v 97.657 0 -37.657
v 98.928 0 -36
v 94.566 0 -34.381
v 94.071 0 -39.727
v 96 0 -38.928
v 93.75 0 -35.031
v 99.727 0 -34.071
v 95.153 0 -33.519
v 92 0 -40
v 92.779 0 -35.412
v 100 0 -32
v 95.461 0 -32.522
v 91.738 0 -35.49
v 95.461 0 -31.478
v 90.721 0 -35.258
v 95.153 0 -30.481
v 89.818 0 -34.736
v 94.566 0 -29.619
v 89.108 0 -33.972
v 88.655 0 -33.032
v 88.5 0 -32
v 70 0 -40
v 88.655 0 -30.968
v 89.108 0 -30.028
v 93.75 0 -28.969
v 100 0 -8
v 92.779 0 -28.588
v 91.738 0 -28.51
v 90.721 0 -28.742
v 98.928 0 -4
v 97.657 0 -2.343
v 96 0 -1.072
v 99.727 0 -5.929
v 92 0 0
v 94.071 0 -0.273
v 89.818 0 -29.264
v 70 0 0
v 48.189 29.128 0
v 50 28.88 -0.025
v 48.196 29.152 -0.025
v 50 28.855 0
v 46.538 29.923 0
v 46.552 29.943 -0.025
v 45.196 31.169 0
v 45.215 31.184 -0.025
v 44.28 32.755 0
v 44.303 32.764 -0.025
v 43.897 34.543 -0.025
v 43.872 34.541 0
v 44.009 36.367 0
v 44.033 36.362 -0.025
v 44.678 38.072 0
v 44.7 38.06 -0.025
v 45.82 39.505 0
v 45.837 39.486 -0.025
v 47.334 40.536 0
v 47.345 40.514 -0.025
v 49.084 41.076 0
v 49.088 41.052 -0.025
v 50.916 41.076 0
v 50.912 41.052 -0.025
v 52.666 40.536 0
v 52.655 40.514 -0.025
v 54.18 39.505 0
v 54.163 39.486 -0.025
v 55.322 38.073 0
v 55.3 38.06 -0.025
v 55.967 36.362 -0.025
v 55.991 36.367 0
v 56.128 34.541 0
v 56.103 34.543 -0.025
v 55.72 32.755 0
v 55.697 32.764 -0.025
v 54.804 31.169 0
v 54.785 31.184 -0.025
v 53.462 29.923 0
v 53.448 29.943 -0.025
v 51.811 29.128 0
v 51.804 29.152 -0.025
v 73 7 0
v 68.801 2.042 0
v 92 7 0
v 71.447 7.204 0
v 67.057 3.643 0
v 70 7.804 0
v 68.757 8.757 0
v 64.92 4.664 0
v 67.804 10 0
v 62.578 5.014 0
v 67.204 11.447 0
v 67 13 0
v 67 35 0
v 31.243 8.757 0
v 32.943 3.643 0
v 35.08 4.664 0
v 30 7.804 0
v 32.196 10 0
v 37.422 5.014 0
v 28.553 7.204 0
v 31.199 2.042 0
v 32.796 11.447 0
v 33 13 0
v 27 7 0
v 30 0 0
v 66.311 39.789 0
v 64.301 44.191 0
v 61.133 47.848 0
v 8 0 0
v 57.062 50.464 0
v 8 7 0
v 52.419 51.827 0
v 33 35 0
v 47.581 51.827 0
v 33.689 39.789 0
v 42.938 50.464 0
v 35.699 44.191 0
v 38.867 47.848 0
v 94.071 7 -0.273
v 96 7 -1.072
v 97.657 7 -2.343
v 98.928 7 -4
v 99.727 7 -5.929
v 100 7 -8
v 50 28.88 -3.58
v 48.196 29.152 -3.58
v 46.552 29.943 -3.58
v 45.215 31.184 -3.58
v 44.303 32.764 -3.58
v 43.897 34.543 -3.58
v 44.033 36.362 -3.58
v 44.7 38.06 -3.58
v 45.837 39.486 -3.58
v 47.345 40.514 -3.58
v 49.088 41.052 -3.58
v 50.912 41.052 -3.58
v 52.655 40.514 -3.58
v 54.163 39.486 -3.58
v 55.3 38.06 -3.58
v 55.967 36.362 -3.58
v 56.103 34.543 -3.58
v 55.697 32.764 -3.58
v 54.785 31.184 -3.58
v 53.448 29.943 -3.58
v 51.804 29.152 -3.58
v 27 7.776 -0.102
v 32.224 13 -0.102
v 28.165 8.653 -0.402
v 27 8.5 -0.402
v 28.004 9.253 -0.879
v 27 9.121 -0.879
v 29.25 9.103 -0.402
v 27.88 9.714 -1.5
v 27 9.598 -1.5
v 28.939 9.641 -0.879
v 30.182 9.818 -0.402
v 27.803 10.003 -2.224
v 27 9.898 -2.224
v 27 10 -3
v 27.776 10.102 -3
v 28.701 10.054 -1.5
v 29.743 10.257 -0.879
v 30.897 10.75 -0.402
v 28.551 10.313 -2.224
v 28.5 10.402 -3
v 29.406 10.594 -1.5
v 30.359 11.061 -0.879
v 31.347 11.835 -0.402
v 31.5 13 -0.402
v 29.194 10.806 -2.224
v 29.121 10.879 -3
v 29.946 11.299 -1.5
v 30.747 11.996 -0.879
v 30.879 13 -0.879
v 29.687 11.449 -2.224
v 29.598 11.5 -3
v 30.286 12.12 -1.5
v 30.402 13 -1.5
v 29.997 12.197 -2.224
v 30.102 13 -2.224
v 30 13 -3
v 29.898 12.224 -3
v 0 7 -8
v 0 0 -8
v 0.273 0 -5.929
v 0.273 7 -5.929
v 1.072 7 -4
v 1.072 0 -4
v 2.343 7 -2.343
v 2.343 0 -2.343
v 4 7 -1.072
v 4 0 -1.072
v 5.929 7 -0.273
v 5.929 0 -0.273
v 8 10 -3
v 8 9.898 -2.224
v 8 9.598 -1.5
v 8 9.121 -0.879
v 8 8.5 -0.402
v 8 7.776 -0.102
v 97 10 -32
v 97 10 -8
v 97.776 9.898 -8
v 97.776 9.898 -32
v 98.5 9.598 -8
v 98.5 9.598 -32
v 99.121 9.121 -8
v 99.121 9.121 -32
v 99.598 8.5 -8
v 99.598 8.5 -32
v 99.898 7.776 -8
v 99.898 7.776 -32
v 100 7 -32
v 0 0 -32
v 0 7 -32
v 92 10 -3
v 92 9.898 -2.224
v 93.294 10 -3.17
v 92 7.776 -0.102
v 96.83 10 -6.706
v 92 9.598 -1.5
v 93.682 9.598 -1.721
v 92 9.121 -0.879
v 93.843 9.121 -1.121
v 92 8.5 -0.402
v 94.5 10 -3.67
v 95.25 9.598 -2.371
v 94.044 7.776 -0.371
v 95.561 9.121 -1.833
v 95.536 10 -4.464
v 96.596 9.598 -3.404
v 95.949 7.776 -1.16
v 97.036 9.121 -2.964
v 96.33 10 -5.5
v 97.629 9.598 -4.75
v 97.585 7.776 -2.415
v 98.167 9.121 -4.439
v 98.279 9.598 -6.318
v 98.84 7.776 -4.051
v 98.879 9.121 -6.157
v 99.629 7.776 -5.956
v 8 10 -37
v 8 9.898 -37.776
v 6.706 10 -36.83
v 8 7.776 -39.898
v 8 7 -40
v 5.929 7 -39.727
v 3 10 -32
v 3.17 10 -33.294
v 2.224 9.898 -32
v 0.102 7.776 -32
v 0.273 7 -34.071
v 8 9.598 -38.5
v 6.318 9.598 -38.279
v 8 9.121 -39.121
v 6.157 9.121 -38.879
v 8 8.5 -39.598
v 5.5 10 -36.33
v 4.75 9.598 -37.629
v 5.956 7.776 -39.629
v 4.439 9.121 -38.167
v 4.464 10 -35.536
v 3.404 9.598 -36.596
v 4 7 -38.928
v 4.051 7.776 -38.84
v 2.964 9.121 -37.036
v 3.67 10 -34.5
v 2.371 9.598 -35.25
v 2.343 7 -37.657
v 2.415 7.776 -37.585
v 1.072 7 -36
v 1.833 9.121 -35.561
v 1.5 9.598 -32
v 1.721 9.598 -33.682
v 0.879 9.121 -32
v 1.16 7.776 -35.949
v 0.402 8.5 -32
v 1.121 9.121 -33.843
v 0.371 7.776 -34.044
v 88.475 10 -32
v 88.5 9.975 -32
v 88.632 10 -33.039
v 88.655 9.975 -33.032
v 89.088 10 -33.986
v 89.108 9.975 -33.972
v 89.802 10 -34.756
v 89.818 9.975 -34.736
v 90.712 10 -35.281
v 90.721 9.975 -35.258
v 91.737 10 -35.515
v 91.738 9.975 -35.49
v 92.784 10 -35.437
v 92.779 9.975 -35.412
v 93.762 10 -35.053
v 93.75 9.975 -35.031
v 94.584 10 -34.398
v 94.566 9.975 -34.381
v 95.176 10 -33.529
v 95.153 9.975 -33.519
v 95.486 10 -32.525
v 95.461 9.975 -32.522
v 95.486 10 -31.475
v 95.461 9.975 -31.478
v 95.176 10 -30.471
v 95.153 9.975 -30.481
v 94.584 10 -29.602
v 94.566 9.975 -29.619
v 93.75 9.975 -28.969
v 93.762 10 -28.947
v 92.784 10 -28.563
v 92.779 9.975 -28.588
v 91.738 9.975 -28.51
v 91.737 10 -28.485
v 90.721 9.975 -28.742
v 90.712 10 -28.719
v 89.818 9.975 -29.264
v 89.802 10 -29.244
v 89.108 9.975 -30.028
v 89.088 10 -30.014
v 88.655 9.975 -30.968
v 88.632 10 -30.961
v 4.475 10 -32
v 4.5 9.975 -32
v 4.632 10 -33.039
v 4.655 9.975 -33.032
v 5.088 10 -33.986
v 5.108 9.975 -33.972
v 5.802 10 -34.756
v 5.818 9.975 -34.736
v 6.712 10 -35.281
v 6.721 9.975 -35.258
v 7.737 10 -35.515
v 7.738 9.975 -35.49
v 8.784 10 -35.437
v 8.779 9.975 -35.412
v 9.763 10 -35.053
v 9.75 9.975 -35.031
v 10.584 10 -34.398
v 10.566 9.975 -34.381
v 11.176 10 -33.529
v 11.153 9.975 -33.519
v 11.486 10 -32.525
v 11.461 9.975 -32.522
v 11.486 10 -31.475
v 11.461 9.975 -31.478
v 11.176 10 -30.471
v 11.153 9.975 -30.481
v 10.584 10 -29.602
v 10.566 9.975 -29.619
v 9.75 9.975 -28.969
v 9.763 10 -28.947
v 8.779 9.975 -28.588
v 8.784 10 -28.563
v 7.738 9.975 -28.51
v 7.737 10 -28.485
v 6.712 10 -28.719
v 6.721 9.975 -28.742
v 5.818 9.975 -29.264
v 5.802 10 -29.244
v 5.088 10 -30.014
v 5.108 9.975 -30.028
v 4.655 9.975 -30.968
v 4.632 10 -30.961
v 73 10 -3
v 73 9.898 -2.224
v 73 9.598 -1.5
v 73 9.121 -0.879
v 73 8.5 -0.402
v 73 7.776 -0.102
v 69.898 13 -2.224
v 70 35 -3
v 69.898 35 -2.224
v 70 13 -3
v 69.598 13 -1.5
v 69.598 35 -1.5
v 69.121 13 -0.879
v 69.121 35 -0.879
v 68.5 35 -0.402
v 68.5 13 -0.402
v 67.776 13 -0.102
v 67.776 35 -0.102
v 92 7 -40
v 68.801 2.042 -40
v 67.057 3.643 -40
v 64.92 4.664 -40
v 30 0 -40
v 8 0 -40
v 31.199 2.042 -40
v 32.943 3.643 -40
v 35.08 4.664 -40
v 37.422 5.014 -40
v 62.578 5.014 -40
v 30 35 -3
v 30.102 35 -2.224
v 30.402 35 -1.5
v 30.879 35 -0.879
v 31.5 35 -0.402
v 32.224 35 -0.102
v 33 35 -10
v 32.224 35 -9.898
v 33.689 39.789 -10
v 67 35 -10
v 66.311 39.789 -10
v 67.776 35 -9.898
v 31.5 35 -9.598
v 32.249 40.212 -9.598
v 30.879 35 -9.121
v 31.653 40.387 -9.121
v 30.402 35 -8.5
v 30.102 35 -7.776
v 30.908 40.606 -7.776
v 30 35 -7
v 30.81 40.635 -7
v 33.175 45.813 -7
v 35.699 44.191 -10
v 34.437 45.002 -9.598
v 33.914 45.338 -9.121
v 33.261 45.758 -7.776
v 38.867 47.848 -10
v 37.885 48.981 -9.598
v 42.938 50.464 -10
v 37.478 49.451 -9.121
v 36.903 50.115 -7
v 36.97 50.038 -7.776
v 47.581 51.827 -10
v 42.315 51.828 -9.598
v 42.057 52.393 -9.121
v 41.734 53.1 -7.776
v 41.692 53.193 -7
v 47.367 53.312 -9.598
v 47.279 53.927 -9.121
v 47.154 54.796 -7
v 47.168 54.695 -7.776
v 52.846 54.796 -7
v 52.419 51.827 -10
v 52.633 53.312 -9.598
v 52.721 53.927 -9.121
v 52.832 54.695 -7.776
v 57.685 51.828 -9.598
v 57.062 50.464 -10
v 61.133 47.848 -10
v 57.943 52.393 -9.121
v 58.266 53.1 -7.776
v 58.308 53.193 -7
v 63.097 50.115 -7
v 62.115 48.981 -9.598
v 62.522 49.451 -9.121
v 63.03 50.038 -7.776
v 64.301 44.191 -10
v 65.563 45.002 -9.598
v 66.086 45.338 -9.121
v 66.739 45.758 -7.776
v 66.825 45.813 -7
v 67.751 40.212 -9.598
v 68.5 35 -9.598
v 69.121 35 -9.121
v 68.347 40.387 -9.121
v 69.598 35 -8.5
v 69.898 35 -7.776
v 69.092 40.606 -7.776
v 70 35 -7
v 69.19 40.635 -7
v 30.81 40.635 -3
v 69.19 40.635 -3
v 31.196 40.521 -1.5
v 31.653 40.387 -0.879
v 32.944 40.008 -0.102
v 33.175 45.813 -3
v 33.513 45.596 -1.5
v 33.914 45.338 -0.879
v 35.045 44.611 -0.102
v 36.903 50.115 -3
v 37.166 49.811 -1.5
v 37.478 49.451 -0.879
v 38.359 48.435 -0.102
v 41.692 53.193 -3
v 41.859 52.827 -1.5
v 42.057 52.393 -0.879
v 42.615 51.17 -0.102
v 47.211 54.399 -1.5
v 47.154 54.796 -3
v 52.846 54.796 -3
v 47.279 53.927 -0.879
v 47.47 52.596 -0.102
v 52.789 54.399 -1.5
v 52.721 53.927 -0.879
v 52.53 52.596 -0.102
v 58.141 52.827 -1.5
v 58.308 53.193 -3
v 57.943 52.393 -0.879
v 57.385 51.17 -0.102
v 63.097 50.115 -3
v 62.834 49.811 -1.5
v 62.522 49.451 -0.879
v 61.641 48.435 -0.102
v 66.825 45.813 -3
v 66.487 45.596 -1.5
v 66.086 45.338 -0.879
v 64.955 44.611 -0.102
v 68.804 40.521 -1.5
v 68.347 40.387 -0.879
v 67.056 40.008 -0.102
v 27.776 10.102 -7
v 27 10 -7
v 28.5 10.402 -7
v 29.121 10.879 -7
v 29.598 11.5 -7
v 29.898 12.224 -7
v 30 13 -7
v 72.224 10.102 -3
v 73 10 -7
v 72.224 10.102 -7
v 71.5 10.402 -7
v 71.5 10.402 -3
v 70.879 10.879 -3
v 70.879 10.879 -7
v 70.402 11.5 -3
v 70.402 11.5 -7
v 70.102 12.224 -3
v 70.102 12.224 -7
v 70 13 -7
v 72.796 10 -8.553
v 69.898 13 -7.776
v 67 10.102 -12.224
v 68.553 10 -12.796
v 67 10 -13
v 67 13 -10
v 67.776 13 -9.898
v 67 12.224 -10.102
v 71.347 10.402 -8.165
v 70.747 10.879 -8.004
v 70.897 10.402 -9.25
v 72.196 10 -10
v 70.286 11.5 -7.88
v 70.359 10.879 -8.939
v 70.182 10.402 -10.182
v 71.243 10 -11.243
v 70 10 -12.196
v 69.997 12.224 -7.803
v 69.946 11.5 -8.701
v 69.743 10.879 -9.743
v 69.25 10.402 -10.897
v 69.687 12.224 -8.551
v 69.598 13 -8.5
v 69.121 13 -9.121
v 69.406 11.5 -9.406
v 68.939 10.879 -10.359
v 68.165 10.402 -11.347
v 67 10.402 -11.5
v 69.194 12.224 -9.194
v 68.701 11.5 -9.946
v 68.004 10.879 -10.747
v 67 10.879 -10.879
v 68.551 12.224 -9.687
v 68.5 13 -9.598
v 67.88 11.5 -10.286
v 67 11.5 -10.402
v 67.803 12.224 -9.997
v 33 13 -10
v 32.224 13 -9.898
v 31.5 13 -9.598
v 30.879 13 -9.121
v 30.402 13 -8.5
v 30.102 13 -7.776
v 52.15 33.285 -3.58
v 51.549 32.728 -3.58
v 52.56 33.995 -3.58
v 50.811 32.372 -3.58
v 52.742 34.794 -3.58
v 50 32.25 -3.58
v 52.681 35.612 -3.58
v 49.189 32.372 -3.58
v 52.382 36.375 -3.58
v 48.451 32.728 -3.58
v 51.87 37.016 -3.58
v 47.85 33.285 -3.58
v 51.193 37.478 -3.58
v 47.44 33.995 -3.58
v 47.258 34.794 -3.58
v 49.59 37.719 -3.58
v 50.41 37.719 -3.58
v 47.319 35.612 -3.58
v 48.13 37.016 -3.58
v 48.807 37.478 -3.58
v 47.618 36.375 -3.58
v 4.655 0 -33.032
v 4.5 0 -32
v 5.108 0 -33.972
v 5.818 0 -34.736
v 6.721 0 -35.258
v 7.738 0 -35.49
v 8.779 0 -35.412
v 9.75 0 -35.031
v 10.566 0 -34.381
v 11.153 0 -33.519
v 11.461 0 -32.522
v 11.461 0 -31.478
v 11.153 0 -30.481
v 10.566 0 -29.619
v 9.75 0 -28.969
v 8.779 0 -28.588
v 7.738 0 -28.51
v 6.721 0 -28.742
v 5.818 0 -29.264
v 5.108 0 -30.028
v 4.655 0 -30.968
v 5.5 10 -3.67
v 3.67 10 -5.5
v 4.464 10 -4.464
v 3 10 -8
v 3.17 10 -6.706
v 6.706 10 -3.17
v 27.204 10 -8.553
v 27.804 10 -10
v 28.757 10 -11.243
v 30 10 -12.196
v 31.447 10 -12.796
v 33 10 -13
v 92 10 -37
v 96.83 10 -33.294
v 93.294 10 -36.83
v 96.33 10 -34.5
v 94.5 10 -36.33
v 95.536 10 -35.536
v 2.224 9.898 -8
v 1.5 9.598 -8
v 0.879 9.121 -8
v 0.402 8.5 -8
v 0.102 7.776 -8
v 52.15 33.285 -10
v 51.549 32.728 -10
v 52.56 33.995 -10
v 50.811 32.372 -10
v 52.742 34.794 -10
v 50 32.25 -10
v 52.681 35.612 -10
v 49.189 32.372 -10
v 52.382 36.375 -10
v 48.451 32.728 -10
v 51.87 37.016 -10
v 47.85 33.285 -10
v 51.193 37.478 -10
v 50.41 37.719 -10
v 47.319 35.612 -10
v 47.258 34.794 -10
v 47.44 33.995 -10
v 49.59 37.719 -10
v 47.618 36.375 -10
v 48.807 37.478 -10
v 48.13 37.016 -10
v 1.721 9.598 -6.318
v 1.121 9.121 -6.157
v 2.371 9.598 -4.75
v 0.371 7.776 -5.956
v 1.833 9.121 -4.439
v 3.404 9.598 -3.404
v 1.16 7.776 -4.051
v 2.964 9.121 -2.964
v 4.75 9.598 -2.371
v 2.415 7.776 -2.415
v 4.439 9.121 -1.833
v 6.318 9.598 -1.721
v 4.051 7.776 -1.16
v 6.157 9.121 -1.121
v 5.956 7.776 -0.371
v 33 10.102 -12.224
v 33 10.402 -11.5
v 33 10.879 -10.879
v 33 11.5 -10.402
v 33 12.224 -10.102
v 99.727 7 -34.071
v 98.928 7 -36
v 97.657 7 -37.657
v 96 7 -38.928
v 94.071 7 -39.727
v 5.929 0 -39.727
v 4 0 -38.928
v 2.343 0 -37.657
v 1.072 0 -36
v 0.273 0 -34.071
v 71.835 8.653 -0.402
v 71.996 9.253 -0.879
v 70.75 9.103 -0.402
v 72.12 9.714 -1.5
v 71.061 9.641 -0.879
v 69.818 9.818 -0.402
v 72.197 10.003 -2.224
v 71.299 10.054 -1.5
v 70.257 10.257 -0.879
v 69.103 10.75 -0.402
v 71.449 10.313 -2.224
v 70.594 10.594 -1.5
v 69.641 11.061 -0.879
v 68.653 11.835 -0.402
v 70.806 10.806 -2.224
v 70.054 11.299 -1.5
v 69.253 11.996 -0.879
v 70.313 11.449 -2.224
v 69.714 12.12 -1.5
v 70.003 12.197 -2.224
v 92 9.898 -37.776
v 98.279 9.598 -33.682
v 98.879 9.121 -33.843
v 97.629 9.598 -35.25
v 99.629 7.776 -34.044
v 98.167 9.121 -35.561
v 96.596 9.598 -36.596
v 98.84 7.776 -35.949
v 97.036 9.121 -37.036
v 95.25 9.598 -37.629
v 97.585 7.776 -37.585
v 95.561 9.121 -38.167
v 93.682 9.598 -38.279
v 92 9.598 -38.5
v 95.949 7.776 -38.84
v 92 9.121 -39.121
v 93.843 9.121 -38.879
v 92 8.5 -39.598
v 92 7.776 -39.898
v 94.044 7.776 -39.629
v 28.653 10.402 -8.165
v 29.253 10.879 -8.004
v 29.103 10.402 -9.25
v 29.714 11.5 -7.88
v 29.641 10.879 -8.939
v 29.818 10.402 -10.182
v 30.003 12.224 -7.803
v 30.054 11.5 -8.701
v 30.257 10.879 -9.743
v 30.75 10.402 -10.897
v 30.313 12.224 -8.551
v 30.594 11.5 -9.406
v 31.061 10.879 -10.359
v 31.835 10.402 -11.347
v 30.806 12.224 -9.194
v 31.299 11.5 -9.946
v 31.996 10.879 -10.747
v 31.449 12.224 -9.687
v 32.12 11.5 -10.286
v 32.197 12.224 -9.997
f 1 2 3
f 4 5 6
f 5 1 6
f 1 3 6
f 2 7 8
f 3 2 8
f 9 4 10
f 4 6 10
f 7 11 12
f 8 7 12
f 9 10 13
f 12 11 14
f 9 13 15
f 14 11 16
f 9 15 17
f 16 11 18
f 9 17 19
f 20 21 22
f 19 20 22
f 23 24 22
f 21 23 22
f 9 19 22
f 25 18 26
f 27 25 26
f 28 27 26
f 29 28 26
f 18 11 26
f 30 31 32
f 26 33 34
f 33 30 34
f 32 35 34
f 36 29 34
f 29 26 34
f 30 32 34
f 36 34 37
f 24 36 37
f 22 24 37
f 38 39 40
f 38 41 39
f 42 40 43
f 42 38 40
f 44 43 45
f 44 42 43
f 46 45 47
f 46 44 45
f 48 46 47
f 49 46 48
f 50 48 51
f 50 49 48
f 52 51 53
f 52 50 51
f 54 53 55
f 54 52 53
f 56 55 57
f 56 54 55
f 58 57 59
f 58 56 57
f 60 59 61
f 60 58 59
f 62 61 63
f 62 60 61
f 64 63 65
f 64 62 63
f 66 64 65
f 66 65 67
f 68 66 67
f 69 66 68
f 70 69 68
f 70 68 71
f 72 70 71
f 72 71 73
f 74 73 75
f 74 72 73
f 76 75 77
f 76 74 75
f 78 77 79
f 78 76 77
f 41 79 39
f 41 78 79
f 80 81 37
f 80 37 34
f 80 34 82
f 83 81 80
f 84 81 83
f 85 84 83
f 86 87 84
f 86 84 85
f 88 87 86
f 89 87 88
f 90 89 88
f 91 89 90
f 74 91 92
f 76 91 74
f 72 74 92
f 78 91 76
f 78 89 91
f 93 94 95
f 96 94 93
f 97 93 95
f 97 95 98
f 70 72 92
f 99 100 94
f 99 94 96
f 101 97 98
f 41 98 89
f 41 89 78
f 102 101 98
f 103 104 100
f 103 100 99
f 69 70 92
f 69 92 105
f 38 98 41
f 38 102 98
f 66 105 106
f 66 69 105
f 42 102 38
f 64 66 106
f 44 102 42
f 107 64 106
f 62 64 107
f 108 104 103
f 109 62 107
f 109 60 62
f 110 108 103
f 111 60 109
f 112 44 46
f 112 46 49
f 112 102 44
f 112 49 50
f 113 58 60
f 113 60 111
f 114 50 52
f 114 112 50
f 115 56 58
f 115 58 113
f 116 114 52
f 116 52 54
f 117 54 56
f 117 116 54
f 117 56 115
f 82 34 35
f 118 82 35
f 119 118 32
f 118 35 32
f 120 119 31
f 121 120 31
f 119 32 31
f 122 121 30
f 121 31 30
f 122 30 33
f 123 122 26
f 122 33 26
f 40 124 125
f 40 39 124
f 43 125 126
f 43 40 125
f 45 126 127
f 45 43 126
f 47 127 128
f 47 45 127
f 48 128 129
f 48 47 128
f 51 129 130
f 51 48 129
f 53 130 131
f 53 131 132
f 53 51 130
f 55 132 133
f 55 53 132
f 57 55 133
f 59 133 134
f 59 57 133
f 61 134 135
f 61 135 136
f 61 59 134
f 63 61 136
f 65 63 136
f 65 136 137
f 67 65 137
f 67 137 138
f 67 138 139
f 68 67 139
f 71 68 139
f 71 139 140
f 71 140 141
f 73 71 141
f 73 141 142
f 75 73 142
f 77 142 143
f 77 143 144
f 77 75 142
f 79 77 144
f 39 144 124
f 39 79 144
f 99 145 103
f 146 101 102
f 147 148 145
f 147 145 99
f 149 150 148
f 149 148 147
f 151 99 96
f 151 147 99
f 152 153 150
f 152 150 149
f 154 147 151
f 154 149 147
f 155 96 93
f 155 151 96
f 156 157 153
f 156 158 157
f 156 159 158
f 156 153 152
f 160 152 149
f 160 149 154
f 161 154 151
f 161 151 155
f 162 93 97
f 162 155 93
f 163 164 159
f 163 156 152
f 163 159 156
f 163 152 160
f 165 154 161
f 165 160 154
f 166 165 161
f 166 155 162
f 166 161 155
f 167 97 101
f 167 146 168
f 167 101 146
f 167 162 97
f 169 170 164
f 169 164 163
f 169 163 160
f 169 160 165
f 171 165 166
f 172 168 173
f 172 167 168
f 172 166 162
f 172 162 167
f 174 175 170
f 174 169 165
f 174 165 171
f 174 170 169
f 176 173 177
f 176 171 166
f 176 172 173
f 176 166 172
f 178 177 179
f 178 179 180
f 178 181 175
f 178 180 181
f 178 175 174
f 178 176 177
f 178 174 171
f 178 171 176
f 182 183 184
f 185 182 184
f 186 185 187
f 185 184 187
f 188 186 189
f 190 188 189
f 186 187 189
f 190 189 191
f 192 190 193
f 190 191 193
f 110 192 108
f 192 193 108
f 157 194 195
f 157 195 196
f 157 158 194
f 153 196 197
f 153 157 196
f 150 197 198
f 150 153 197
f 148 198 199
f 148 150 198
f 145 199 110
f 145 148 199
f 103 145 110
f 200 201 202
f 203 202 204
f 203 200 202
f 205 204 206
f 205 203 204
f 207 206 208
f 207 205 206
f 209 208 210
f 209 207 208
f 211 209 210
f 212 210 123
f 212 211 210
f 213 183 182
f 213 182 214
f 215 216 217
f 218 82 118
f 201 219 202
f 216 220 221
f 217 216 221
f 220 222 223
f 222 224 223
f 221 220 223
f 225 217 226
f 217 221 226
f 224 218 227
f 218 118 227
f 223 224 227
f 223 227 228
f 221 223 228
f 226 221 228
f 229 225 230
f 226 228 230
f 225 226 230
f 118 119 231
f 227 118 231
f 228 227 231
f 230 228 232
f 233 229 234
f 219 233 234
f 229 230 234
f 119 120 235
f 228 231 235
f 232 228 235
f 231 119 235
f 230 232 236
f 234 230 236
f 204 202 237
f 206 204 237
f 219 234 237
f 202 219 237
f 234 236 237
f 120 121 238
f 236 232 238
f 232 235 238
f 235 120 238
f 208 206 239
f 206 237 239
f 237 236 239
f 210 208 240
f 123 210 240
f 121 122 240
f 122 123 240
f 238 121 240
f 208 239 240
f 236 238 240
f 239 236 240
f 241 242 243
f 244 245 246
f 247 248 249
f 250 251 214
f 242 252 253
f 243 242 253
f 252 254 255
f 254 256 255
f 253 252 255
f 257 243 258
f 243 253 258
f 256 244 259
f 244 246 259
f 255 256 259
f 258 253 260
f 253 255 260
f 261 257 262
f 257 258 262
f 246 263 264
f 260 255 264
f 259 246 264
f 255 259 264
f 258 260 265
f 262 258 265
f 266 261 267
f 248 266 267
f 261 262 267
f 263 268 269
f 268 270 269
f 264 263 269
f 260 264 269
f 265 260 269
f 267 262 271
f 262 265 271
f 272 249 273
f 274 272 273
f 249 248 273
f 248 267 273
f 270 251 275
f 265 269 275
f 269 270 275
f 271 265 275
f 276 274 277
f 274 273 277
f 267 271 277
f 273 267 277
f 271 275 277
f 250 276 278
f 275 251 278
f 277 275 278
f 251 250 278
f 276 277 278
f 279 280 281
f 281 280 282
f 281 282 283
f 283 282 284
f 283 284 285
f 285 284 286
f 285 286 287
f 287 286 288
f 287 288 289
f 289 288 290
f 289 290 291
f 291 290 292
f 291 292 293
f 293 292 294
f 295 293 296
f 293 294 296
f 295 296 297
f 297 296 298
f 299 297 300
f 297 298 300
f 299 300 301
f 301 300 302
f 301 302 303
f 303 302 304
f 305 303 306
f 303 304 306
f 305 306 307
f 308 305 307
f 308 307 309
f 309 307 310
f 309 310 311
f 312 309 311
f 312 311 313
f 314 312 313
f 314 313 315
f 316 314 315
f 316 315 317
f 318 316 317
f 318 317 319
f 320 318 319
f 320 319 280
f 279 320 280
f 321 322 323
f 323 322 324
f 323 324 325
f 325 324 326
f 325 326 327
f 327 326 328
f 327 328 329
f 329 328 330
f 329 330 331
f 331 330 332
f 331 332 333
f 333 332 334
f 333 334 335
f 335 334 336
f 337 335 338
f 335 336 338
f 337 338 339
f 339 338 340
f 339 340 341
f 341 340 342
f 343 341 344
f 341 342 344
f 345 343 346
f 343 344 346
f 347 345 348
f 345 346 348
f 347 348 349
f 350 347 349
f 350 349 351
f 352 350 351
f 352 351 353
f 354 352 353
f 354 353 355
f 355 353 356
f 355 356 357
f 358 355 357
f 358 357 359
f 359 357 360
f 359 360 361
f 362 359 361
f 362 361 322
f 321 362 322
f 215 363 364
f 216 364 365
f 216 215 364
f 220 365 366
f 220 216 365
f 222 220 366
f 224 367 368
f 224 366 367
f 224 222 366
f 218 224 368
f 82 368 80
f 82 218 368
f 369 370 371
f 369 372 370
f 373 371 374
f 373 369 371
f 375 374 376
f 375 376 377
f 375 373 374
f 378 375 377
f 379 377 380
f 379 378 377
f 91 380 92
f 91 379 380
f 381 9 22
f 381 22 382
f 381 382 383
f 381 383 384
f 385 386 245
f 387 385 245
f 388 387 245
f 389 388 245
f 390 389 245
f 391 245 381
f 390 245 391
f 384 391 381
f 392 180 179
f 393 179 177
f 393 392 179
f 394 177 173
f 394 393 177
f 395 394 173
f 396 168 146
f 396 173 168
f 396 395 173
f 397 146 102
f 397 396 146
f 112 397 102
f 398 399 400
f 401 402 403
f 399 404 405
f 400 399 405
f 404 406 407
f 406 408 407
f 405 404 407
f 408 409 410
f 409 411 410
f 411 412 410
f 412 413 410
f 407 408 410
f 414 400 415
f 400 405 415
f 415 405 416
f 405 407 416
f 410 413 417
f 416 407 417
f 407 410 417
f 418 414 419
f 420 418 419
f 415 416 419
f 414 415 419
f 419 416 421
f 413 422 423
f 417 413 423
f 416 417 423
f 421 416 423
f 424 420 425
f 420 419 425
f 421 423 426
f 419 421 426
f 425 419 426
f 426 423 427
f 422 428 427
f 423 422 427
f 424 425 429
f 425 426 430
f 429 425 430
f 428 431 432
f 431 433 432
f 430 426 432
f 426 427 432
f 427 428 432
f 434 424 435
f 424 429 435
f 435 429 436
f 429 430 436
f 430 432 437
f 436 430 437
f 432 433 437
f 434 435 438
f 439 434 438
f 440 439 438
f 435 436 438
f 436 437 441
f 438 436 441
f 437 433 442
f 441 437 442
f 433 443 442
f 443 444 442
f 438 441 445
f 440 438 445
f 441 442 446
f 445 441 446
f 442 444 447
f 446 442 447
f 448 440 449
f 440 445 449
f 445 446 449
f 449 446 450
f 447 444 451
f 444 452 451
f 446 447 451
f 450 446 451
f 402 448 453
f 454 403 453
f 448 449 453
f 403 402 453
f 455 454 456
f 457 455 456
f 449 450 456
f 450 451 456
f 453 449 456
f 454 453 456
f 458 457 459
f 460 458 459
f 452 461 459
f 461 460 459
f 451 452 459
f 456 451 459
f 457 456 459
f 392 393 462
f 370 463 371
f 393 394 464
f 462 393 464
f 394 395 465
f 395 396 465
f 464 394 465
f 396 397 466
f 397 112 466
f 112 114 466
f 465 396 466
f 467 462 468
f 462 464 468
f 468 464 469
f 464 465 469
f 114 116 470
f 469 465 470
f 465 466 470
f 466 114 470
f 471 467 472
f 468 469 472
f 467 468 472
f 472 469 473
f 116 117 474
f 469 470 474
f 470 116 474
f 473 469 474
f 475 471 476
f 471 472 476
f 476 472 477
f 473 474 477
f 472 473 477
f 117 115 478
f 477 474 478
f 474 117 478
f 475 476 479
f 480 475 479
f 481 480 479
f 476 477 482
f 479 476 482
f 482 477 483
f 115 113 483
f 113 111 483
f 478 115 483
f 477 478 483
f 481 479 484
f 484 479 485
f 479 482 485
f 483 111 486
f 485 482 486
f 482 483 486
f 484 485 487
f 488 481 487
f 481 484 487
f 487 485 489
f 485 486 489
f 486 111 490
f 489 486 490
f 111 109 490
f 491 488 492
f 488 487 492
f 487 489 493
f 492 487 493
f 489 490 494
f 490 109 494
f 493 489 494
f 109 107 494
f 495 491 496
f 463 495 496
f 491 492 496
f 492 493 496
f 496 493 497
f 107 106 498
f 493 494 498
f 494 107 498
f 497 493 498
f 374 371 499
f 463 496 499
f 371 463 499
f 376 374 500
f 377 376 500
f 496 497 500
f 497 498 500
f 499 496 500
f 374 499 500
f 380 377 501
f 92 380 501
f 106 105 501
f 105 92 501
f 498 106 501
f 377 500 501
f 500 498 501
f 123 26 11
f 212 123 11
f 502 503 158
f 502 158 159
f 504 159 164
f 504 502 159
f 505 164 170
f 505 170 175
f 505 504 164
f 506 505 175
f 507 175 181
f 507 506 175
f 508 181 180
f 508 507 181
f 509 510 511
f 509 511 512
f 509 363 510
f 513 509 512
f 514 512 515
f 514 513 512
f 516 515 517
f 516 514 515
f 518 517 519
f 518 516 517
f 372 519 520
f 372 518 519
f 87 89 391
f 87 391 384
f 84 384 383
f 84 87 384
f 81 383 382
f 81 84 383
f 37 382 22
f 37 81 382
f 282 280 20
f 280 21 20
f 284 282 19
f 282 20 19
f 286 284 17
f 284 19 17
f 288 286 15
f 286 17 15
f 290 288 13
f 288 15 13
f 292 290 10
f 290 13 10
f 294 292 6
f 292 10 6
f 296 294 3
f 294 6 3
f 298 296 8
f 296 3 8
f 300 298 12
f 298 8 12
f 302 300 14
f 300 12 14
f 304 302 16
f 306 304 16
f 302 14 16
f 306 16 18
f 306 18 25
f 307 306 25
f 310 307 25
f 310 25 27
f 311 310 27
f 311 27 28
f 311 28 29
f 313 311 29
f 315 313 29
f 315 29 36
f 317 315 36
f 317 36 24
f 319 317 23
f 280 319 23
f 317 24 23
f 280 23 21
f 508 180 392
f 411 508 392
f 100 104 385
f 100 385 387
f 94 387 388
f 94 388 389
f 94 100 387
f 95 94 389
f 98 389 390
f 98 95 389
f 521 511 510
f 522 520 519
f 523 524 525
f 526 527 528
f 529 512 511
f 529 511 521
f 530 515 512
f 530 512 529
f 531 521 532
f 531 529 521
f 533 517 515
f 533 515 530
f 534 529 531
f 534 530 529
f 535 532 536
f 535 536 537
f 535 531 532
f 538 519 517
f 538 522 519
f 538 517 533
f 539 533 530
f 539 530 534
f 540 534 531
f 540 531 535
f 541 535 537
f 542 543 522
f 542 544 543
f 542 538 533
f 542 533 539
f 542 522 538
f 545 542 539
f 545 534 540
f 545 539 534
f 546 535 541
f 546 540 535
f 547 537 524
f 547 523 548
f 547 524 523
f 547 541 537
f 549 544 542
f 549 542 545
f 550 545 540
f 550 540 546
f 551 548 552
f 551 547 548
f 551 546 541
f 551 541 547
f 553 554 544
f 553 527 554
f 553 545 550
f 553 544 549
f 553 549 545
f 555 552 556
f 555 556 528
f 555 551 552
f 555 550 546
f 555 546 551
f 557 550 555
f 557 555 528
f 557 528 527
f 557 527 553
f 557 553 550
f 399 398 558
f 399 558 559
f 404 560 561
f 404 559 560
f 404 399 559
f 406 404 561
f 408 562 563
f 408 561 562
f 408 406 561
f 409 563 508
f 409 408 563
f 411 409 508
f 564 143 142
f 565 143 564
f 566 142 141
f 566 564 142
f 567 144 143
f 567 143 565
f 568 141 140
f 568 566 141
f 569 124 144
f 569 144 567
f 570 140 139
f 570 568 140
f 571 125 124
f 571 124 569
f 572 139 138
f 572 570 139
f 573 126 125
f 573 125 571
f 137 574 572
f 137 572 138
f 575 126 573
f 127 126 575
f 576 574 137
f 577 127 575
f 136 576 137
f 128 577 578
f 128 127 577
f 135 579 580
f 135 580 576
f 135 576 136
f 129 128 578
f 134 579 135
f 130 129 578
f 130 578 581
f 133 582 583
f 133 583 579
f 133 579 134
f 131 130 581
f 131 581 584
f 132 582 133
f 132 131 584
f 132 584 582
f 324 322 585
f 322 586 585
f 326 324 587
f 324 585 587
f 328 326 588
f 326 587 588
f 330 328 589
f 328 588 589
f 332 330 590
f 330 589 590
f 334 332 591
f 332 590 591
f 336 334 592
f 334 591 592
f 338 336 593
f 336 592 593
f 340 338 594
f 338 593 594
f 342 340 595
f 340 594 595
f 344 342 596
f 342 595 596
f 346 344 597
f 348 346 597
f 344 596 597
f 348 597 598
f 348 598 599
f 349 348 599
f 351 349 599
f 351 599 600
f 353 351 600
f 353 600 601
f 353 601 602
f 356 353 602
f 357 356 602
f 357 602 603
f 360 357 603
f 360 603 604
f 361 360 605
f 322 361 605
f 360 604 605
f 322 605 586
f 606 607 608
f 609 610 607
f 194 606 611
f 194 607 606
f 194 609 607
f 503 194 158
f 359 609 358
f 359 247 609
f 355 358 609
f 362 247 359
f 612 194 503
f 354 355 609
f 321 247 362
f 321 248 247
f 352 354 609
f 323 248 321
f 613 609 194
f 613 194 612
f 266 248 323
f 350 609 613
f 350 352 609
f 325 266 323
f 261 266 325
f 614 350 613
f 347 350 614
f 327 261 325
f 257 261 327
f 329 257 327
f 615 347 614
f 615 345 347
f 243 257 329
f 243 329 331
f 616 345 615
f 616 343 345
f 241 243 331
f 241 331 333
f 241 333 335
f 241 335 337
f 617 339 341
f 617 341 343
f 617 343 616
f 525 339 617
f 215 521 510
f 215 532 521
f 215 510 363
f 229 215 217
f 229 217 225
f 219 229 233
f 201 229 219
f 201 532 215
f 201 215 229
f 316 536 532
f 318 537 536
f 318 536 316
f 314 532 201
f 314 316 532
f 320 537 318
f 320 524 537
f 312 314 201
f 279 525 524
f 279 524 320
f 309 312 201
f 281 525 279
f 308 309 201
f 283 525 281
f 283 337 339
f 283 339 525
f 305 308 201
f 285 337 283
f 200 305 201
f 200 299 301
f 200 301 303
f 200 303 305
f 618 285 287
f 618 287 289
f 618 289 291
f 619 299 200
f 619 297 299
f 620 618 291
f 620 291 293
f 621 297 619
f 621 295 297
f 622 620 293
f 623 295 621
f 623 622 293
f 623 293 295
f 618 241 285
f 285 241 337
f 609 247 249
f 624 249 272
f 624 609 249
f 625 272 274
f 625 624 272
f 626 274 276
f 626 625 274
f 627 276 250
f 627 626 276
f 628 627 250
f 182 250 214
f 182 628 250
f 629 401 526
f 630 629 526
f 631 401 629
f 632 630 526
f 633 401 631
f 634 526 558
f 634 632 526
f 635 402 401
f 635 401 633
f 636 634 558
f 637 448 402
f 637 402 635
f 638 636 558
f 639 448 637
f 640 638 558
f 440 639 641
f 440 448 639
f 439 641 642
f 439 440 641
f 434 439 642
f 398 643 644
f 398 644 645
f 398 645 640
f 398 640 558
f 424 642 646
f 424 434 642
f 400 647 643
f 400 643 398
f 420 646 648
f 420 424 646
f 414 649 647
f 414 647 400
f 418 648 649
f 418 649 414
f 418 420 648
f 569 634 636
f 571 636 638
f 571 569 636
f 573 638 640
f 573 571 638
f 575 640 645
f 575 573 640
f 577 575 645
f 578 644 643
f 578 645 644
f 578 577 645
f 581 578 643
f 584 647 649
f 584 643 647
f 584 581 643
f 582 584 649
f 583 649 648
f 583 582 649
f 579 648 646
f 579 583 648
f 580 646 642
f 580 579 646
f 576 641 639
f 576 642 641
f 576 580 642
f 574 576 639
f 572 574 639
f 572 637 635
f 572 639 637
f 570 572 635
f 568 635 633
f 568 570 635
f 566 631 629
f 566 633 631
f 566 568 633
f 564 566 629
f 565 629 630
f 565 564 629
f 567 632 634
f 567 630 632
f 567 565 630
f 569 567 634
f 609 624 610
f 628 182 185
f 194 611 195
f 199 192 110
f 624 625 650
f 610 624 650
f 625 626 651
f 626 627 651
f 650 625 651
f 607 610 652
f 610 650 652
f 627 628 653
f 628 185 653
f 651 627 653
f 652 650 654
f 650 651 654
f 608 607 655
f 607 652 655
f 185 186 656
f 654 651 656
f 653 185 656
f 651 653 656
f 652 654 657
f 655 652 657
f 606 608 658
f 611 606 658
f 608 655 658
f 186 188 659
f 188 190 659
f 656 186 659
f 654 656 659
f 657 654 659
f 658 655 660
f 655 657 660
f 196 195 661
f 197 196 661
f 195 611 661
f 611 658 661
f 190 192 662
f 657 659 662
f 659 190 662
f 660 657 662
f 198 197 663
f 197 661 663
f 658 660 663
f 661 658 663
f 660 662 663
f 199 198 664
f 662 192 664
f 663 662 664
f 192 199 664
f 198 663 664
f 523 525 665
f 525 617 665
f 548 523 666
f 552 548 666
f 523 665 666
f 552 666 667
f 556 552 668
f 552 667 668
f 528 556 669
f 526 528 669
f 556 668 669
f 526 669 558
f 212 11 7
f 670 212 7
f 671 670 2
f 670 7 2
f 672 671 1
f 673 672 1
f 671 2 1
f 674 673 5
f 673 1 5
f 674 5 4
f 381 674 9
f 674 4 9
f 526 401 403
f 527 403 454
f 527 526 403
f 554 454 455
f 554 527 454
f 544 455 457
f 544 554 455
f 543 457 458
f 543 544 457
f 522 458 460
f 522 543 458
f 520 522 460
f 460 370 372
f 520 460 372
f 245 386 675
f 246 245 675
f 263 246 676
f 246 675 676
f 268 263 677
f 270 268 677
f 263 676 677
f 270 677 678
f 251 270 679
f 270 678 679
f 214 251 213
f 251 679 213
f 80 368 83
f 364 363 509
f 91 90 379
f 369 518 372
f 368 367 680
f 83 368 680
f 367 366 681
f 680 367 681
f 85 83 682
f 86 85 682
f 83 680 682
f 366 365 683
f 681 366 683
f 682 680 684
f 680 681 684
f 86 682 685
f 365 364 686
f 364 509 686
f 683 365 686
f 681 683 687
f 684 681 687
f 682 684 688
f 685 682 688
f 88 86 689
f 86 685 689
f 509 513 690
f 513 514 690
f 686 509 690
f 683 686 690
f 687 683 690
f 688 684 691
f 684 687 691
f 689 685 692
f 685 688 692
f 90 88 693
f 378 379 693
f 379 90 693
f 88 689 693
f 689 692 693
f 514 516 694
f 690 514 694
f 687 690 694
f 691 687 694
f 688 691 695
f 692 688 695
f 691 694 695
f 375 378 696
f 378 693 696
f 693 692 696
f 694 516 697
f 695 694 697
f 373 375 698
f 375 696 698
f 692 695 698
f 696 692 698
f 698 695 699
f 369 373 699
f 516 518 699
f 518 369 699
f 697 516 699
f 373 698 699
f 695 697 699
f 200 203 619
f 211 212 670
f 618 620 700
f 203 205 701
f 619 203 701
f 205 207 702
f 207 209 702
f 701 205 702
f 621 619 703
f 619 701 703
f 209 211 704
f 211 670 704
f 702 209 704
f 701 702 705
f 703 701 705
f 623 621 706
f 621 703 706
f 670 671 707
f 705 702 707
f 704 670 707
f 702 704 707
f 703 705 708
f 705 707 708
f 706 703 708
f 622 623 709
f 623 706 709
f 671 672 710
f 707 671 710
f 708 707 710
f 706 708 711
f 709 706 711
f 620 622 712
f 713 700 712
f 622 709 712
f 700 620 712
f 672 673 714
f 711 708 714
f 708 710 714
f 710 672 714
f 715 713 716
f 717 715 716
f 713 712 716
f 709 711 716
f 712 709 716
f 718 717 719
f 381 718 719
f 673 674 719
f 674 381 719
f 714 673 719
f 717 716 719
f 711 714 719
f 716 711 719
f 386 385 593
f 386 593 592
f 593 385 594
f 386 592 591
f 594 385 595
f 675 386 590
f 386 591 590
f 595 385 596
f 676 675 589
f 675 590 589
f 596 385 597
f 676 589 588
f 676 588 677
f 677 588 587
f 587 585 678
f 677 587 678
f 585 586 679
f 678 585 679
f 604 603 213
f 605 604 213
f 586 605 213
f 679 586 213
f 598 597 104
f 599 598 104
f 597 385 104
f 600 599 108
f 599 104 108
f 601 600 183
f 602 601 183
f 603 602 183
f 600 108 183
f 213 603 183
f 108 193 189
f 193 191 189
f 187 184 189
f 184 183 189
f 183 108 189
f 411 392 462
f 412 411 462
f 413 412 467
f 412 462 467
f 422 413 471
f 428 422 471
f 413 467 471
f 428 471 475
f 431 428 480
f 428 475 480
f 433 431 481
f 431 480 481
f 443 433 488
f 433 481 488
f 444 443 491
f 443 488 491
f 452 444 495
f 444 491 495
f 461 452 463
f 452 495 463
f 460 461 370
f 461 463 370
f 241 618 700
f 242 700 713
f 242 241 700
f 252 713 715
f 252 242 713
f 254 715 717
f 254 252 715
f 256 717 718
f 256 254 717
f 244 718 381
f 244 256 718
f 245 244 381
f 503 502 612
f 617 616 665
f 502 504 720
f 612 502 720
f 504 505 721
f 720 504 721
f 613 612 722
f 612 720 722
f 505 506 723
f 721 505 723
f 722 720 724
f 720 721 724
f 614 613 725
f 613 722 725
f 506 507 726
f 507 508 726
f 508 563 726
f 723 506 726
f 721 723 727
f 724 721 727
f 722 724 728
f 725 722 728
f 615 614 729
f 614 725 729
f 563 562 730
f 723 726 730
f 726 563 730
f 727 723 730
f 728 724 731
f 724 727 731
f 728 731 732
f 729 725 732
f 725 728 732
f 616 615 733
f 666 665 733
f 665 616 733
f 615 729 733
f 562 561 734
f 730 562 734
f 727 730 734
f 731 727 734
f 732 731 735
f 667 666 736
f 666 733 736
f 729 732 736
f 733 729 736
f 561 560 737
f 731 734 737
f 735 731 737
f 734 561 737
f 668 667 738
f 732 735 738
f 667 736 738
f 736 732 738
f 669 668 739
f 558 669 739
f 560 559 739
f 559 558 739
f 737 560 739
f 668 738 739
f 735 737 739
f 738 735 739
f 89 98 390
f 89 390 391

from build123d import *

# Parameters (mm, degrees)
ESBO_O1_W                            = 100
ESBO_O1_H                            = 40
RESSALTO_EXTRUS_O1_DEPTH             = 10
RESSALTO_EXTRUS_O2_DEPTH             = 10
ESBO_O4_W                            = 40
ESBO_O4_H                            = 5.013946539
CORTE_EXTRUS_O1_DEPTH                = 121.933866224
FILETE1_R                            = 8
FURO_DE_DI_METRO_7_0_7_1_D           = 7
FURO_DE_DI_METRO_7_0_7_1_CSINK_D     = 7.05
FURO_DE_DI_METRO_7_0_7_1_CSINK_ANGLE = 90
FILETE2_R                            = 3


with BuildPart() as part:
    # Esboço1 → Ressalto-extrusão1 (new body)
    with BuildSketch(Plane(origin=(0, 0, 0), x_dir=(1, 0, 0), z_dir=(0, 1, 0))):
        with Locations((50, 20)):
            Rectangle(ESBO_O1_W, ESBO_O1_H)
    extrude(amount=RESSALTO_EXTRUS_O1_DEPTH)

    # Esboço3 → Ressalto-extrusão2 (add)
    with BuildSketch(Plane.XY):
        with BuildLine():
            Line((30, 0), (30, 35))
            ThreePointArc((30, 35), (50, 55), (70, 35))
            Line((70, 35), (70, 0))
            Line((70, 0), (30, 0))
        make_face()
    extrude(amount=-RESSALTO_EXTRUS_O2_DEPTH)

    # Esboço4 → Corte-extrusão1 (cut, through all)
    with BuildSketch(Plane.XY):
        with Locations((50, 2.506973269)):
            Rectangle(ESBO_O4_W, ESBO_O4_H)
    extrude(amount=-CORTE_EXTRUS_O1_DEPTH, mode=Mode.SUBTRACT)

    # Esboço6 → Rebaixo para parafuso de cabeça sextavada de M51 (revolve, cut)
    with BuildSketch(Plane(origin=(50, 35, 0), x_dir=(0, -1, 0), z_dir=(1, 0, 0))):
        Polygon((0, 0), (0, 40), (2.75, 40), (2.75, 3.58), (6.12, 3.58), (6.12, 0.025), (6.145, 0), align=None)
    revolve(axis=Axis((50, 35, 6.35), (0, 0, -1)), mode=Mode.SUBTRACT)

    # Filete1
    # the kernel refuses this fillet: 8 mm, written as the material it adds along each edge
    with BuildSketch(Plane(origin=(70, 5.013946539, 0), x_dir=(-1, 0, 0), z_dir=(0, 0, -1))) as filete1_piece_1:
        with BuildLine():
            CenterArc((7.421824892, -8), FILETE1_R, 90, 68.083393909)
            Line((0, -5.013946539), (0, 0))
            Line((0, 0), (7.421824892, 0))
        make_face()
    extrude(amount=40)
    with BuildSketch(Plane(origin=(30, 5.013946539, 0), x_dir=(0, -1, 0), z_dir=(0, 0, -1))) as filete1_piece_2:
        with BuildLine():
            CenterArc((8, -7.421824892), FILETE1_R, 111.916606091, 68.083393909)
            Line((0, -7.421824892), (0, 0))
            Line((0, 0), (5.013946539, 0))
        make_face()
    extrude(amount=40)
    # the kernel refuses this fillet: 8 mm, written as the material it takes off along each edge
    with BuildSketch(Plane(origin=(0, -20, -40), x_dir=(0, 0, 1), z_dir=(0, 1, 0)), Plane(origin=(0, -20, 0), x_dir=(1, 0, 0), z_dir=(0, 1, 0))) as filete1_2_piece_1:
        with BuildLine():
            CenterArc((FILETE1_R, FILETE1_R), FILETE1_R, 180, 90)
            Line((0, FILETE1_R), (0, 0))
            Line((0, 0), (FILETE1_R, 0))
        make_face()
    extrude(amount=50, mode=Mode.SUBTRACT)
    with BuildSketch(Plane(origin=(100, -20, -40), x_dir=(0, 0, 1), z_dir=(0, 1, 0)), Plane(origin=(100, -20, 0), x_dir=(-1, 0, 0), z_dir=(0, 1, 0))) as filete1_2_piece_2:
        with BuildLine():
            CenterArc((FILETE1_R, -FILETE1_R), FILETE1_R, 90, 90)
            Line((0, -FILETE1_R), (0, 0))
            Line((0, 0), (FILETE1_R, 0))
        make_face()
    extrude(amount=50, mode=Mode.SUBTRACT)

    # Furo de diâmetro Ø7.0 (7)1 (through all)
    with Locations(Plane(origin=(0, 10, 0), x_dir=(1, 0, 0), z_dir=(0, 1, 0))):
        with Locations((8, 32), (92, 32)):
            CounterSinkHole(FURO_DE_DI_METRO_7_0_7_1_D / 2, FURO_DE_DI_METRO_7_0_7_1_CSINK_D / 2, counter_sink_angle=FURO_DE_DI_METRO_7_0_7_1_CSINK_ANGLE)

    # Filete2
    filete2_edges = [part.edges().sort_by_distance(p)[0] for p in [
        (81, 10, 0),
        (30, 22.5, -10),
        (70, 22.5, -10),
        (30, 22.5, 0),
        (70, 22.5, 0),
        (50, 55, 0),
        (30, 10, -5),
        (50, 55, -10),
        (70, 10, -5),
        (50, 10, -10),
        (0, 10, -20),
        (50, 10, -40),
        (19, 10, 0),
        (100, 10, -20),
        (97.656854249, 10, -2.343145751),
        (97.656854249, 10, -37.656854249),
        (2.343145751, 10, -2.343145751),
        (2.343145751, 10, -37.656854249),
    ]]
    fillet(filete2_edges, radius=FILETE2_R)


solid = part.part
